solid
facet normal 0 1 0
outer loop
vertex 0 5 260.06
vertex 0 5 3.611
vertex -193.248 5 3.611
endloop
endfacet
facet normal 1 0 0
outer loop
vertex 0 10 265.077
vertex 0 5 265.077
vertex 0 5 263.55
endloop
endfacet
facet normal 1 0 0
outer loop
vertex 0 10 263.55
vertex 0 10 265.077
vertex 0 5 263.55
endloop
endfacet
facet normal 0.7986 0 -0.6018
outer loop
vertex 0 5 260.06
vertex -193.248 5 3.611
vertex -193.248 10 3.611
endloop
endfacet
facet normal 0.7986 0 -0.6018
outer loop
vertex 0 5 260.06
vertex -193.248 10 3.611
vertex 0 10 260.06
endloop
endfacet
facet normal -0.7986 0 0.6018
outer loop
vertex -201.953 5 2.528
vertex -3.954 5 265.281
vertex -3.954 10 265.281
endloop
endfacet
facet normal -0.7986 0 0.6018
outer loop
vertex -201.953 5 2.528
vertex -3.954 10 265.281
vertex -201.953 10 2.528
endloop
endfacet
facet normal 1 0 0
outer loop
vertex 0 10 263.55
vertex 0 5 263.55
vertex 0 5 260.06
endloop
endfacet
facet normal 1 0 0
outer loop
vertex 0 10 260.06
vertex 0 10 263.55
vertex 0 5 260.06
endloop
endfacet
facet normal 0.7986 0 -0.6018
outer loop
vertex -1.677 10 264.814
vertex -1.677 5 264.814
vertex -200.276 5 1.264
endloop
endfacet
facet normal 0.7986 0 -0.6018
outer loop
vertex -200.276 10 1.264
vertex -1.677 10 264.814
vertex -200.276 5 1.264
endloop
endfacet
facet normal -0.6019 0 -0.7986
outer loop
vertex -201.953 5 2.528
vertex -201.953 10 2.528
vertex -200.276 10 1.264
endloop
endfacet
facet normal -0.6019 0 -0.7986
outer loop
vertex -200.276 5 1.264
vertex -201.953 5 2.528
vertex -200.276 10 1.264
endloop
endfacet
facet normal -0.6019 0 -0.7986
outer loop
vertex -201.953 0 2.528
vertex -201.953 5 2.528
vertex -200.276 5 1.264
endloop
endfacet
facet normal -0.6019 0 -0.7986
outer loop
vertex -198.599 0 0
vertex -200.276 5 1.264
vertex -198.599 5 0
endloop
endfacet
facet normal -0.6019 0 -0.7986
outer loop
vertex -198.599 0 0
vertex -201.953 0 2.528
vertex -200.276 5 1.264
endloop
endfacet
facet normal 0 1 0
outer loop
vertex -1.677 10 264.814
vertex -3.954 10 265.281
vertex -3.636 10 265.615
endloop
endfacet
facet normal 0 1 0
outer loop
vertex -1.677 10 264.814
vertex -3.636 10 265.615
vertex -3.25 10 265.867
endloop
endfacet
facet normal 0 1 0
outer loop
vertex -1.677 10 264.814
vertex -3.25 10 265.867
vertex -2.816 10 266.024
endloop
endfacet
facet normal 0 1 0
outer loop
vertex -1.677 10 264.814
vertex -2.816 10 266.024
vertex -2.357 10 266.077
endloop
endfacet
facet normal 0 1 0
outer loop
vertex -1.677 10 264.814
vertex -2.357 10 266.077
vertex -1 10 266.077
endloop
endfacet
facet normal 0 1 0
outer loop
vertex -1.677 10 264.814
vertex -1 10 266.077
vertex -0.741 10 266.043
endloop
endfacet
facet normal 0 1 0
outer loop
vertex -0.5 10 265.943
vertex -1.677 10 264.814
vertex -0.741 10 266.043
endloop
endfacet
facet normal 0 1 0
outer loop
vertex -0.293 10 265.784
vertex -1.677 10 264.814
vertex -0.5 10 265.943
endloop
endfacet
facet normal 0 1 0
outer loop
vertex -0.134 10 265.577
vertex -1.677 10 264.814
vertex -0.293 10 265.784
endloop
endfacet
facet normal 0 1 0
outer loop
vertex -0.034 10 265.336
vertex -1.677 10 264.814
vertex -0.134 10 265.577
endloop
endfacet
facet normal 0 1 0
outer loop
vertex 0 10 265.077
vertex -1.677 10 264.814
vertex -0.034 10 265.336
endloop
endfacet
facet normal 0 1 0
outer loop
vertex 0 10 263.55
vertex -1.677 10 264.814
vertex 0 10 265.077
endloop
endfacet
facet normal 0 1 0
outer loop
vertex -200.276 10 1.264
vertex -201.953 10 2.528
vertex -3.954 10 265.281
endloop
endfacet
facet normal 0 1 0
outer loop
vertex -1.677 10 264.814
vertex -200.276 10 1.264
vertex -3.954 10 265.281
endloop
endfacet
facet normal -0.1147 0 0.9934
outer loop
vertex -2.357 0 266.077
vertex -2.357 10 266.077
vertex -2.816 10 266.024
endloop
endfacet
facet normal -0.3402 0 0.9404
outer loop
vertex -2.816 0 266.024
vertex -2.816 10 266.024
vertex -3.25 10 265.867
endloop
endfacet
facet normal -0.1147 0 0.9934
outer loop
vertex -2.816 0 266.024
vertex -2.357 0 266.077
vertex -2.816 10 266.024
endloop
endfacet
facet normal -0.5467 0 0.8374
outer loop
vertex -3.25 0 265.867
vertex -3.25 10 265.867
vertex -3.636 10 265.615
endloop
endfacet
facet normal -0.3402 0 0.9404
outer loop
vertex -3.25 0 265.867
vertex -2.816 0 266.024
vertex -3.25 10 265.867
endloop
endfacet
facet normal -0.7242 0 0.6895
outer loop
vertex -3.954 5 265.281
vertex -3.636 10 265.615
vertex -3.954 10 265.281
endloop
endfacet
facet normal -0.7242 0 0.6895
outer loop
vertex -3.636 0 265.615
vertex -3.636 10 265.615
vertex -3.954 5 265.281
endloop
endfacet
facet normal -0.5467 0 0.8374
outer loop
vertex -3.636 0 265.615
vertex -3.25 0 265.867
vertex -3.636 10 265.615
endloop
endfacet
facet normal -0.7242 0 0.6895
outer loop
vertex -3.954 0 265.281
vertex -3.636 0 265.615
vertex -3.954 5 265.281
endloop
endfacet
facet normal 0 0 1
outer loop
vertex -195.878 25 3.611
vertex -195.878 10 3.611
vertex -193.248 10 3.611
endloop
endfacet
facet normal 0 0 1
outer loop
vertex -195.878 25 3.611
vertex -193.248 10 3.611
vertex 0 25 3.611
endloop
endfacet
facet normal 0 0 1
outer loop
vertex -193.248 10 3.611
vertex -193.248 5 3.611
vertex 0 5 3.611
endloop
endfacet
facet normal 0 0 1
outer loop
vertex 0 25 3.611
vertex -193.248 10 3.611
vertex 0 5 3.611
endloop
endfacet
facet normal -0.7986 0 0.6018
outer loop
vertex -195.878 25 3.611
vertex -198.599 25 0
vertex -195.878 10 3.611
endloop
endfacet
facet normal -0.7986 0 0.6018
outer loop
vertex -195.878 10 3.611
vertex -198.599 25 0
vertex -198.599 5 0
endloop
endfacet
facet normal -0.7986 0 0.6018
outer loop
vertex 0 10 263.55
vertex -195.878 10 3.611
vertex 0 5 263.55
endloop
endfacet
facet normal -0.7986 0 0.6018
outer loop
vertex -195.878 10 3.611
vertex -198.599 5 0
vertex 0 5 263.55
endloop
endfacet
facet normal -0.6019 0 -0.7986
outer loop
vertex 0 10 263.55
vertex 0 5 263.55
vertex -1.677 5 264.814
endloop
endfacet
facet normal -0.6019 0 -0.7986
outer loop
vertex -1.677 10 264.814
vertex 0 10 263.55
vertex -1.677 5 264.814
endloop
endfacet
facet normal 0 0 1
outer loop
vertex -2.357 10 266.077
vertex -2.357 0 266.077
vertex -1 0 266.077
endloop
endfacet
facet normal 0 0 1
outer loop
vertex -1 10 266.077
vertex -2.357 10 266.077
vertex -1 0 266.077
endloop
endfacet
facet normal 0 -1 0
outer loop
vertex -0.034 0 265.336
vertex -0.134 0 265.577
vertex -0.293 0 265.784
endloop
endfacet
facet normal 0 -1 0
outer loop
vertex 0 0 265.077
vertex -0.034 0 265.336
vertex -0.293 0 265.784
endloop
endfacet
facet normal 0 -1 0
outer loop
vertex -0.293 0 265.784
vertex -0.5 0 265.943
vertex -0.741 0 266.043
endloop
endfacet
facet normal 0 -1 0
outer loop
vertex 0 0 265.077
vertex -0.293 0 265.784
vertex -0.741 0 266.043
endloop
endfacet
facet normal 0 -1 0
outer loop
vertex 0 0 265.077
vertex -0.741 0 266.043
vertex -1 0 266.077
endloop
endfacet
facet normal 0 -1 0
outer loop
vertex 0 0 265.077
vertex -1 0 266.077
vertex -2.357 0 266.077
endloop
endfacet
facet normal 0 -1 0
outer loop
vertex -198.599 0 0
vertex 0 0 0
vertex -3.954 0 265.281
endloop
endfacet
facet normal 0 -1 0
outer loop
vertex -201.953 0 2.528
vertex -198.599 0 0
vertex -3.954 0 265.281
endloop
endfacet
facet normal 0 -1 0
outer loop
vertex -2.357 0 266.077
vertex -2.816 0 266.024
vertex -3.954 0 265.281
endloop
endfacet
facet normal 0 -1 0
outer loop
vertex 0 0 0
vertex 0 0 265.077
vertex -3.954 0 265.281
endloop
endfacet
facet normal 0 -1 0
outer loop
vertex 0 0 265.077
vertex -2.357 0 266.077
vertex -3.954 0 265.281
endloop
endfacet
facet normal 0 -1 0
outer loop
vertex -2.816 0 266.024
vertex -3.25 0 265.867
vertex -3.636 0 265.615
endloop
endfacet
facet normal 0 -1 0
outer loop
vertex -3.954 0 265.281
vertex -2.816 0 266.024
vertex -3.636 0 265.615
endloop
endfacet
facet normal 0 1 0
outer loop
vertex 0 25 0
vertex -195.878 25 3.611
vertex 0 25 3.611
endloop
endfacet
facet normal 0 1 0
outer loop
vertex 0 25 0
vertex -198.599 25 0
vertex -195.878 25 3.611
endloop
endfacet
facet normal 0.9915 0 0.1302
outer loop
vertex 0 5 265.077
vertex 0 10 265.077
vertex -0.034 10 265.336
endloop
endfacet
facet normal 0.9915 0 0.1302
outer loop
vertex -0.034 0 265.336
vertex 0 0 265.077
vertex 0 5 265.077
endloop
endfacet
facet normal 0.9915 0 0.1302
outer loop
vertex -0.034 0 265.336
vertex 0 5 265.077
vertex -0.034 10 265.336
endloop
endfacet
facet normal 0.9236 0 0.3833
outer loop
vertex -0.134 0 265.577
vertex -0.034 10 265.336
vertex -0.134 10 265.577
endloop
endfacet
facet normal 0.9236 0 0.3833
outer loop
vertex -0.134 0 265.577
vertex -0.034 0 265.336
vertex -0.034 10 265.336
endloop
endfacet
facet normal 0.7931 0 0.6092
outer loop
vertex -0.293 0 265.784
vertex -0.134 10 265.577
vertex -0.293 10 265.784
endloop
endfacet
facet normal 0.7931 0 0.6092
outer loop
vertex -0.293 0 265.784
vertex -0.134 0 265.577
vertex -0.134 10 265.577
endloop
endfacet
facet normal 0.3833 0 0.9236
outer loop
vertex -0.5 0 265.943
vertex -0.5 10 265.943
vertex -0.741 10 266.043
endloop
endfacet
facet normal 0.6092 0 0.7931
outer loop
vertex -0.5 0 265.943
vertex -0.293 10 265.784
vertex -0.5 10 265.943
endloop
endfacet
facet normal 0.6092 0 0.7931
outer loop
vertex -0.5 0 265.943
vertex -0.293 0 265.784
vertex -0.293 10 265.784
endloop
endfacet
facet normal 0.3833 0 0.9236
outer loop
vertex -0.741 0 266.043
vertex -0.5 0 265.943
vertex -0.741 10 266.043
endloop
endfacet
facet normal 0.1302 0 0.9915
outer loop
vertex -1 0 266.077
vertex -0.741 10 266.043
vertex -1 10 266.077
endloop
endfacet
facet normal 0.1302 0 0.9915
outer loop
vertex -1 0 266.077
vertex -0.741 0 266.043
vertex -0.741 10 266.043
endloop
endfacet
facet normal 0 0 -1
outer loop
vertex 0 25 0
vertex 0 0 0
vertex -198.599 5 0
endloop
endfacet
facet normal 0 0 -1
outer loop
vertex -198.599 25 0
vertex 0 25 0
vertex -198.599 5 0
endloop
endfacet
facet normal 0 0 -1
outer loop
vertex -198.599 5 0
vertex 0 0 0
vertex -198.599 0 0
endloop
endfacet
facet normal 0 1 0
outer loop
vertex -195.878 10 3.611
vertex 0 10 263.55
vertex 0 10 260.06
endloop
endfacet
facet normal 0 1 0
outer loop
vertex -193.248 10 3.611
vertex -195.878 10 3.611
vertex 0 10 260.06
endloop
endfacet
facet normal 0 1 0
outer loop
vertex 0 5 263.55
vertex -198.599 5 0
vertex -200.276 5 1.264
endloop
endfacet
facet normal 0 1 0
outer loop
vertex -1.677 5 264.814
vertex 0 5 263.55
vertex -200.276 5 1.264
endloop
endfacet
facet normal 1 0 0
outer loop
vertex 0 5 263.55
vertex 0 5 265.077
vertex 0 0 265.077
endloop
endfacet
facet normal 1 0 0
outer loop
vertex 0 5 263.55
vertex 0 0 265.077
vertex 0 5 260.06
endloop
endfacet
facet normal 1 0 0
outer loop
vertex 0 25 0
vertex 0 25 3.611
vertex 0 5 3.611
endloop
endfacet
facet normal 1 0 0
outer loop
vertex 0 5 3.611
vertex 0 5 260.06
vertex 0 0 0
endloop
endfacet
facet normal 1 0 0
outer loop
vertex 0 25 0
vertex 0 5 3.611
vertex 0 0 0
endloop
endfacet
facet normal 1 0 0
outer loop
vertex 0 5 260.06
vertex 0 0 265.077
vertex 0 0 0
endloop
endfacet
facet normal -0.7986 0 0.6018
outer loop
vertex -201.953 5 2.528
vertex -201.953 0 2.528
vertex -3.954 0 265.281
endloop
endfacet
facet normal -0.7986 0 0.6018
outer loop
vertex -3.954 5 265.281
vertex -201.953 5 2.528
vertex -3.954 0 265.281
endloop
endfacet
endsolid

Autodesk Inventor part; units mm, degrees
ref_plane "YZ Plane" through (0, 0, 0) normal (1, 0, 0) x (0, 1, 0)
ref_plane "XZ Plane" through (0, 0, 0) normal (0, 1, 0) x (-1, 0, 0)
ref_plane "XY Plane" through (0, 0, 0) normal (0, 0, 1) x (1, 0, 0)
sketch "Skizze1" plane through (0, 0, 0) normal (0, 1, 0) x (-1, 0, 0)
  line L0 (0, 0) -> (198.599, 0)
  line L1 (198.599, 0) -> (0, 263.5497)
  line L2 (0, 263.5497) -> (0, 0)
  line L3 (-198.599, 0) -> (0, -263.5497)
  line L4 (0, 0) -> (-198.599, 0)
  line L5 (-198.599, 0) -> (0, -263.5497)
  line L6 (0, -263.5497) -> (-3.3543, -266.0773)
  line L7 (-3.3543, -266.0773) -> (-201.9532, -2.5276)
  line L8 (-201.9532, -2.5276) -> (-198.599, 0)
  line L9 (-195.878, -3.6109) -> (0, -3.6109)
  line L10 (0, -263.5497) -> (0, 0)
  line L11 (0, -3.6109) -> (0, 0)
  line L12 (-1.6771, -264.8135) -> (-200.2761, -1.2638)
  line L13 (-195.878, -3.6109) -> (-198.599, 0)
  line L14 (0, 0) -> (-198.599, 0)
  line L15 (-1.6771, -264.8135) -> (-3.3543, -266.0773)
  line L16 (0, 263.5497) -> (1.6771, 264.8135)
  line L17 (1.6771, 264.8135) -> (200.2761, 1.2638)
  line L18 (200.2761, 1.2638) -> (198.599, 0)
  line L19 (200.2761, 1.2638) -> (201.9532, 2.5276)
  line L20 (201.9532, 2.5276) -> (3.9544, 265.281)
  line L21 (3.3543, 266.0773) -> (1.6771, 264.8135)
  line L22 (2.3571, 266.0773) -> (1, 266.0773)
  line L23 (0, 265.0773) -> (0, 263.5497)
  arc A0 (3.9544, 265.281) -> (2.3571, 266.0773) centre (2.3571, 264.0773) ccw
  arc A1 (1, 266.0773) -> (0, 265.0773) centre (1, 265.0773) ccw
  point P0 (3.1416, 265.9171)
  dimension "d0" = 37
  dimension "d1" = 330
  dimension "d7" = 4.2
  dimension "d8" = 2.1
  dimension "d9" = 2.1
  dimension "d11" = 2
  dimension "d12" = 1
extrude "Extrusion1" add sketch "Skizze1" along normal blind 5 contours L2 L1 L0 | L1 L16 L17 L18 | L23 A1 L22 A0 L21 L16 | L17 L21 A0 L20 L19
sketch "Skizze2" plane through (0, 5, 0) normal (0, 1, 0) x (1, 0, 0)
  line L0 (-198.599, 0) -> (0, -263.5497) projected
  line L1 (0, 0) -> (-198.599, 0)
  line L2 (-198.599, 0) -> (0, -263.5497)
  line L3 (0, -263.5497) -> (-3.1416, -265.9171)
  line L4 (-3.3543, -266.0773) -> (-201.9532, -2.5276)
  line L5 (-201.9532, -2.5276) -> (-198.599, 0)
  line L6 (-195.878, -3.6109) -> (0, -3.6109)
  line L7 (0, -263.5497) -> (0, 0) projected
  line L8 (0, -3.6109) -> (0, 0)
  line L9 (-1.6771, -264.8135) -> (-200.2761, -1.2638)
  line L10 (-195.878, -3.6109) -> (-198.599, 0)
  line L11 (0, 0) -> (-198.599, 0) projected
  line L12 (-1.6771, -264.8135) -> (-3.3543, -266.0773)
  line L13 (-193.2485, -3.6109) -> (0, -260.0603)
  line L14 (0, -260.0603) -> (0, -263.5497)
  line L15 (0, -265.0773) -> (0, 0) projected
  line L16 (0, 0) -> (-198.599, 0) projected
  line L17 (-198.599, 0) -> (-201.9532, -2.5276) projected
  line L18 (-201.9532, -2.5276) -> (-3.9544, -265.281) projected
  arc A0 (-3.9544, -265.281) -> (-2.3571, -266.0773) centre (-2.3571, -264.0773) ccw projected
  line L19 (-2.3571, -266.0773) -> (-1, -266.0773) projected
  arc A1 (-1, -266.0773) -> (0, -265.0773) centre (-1, -265.0773) ccw projected
  line L20 (-3.1416, -265.9171) -> (-3.3543, -266.0773)
  point P0 (-3.9544, -265.281)
  dimension "d4" = 4.2
  dimension "d10" = 2.1
extrude "Extrusion2" add sketch "Skizze2" along normal blind 5 contours L6 L13 L7 L0 | L9 L3 A0 L4 L5 | L15 A1 L19 A0 L3
extrude "Extrusion3" add sketch "Skizze2" along normal blind 20 contours L1 L7 L6 L0
properties part number "SolarMountLeft"
